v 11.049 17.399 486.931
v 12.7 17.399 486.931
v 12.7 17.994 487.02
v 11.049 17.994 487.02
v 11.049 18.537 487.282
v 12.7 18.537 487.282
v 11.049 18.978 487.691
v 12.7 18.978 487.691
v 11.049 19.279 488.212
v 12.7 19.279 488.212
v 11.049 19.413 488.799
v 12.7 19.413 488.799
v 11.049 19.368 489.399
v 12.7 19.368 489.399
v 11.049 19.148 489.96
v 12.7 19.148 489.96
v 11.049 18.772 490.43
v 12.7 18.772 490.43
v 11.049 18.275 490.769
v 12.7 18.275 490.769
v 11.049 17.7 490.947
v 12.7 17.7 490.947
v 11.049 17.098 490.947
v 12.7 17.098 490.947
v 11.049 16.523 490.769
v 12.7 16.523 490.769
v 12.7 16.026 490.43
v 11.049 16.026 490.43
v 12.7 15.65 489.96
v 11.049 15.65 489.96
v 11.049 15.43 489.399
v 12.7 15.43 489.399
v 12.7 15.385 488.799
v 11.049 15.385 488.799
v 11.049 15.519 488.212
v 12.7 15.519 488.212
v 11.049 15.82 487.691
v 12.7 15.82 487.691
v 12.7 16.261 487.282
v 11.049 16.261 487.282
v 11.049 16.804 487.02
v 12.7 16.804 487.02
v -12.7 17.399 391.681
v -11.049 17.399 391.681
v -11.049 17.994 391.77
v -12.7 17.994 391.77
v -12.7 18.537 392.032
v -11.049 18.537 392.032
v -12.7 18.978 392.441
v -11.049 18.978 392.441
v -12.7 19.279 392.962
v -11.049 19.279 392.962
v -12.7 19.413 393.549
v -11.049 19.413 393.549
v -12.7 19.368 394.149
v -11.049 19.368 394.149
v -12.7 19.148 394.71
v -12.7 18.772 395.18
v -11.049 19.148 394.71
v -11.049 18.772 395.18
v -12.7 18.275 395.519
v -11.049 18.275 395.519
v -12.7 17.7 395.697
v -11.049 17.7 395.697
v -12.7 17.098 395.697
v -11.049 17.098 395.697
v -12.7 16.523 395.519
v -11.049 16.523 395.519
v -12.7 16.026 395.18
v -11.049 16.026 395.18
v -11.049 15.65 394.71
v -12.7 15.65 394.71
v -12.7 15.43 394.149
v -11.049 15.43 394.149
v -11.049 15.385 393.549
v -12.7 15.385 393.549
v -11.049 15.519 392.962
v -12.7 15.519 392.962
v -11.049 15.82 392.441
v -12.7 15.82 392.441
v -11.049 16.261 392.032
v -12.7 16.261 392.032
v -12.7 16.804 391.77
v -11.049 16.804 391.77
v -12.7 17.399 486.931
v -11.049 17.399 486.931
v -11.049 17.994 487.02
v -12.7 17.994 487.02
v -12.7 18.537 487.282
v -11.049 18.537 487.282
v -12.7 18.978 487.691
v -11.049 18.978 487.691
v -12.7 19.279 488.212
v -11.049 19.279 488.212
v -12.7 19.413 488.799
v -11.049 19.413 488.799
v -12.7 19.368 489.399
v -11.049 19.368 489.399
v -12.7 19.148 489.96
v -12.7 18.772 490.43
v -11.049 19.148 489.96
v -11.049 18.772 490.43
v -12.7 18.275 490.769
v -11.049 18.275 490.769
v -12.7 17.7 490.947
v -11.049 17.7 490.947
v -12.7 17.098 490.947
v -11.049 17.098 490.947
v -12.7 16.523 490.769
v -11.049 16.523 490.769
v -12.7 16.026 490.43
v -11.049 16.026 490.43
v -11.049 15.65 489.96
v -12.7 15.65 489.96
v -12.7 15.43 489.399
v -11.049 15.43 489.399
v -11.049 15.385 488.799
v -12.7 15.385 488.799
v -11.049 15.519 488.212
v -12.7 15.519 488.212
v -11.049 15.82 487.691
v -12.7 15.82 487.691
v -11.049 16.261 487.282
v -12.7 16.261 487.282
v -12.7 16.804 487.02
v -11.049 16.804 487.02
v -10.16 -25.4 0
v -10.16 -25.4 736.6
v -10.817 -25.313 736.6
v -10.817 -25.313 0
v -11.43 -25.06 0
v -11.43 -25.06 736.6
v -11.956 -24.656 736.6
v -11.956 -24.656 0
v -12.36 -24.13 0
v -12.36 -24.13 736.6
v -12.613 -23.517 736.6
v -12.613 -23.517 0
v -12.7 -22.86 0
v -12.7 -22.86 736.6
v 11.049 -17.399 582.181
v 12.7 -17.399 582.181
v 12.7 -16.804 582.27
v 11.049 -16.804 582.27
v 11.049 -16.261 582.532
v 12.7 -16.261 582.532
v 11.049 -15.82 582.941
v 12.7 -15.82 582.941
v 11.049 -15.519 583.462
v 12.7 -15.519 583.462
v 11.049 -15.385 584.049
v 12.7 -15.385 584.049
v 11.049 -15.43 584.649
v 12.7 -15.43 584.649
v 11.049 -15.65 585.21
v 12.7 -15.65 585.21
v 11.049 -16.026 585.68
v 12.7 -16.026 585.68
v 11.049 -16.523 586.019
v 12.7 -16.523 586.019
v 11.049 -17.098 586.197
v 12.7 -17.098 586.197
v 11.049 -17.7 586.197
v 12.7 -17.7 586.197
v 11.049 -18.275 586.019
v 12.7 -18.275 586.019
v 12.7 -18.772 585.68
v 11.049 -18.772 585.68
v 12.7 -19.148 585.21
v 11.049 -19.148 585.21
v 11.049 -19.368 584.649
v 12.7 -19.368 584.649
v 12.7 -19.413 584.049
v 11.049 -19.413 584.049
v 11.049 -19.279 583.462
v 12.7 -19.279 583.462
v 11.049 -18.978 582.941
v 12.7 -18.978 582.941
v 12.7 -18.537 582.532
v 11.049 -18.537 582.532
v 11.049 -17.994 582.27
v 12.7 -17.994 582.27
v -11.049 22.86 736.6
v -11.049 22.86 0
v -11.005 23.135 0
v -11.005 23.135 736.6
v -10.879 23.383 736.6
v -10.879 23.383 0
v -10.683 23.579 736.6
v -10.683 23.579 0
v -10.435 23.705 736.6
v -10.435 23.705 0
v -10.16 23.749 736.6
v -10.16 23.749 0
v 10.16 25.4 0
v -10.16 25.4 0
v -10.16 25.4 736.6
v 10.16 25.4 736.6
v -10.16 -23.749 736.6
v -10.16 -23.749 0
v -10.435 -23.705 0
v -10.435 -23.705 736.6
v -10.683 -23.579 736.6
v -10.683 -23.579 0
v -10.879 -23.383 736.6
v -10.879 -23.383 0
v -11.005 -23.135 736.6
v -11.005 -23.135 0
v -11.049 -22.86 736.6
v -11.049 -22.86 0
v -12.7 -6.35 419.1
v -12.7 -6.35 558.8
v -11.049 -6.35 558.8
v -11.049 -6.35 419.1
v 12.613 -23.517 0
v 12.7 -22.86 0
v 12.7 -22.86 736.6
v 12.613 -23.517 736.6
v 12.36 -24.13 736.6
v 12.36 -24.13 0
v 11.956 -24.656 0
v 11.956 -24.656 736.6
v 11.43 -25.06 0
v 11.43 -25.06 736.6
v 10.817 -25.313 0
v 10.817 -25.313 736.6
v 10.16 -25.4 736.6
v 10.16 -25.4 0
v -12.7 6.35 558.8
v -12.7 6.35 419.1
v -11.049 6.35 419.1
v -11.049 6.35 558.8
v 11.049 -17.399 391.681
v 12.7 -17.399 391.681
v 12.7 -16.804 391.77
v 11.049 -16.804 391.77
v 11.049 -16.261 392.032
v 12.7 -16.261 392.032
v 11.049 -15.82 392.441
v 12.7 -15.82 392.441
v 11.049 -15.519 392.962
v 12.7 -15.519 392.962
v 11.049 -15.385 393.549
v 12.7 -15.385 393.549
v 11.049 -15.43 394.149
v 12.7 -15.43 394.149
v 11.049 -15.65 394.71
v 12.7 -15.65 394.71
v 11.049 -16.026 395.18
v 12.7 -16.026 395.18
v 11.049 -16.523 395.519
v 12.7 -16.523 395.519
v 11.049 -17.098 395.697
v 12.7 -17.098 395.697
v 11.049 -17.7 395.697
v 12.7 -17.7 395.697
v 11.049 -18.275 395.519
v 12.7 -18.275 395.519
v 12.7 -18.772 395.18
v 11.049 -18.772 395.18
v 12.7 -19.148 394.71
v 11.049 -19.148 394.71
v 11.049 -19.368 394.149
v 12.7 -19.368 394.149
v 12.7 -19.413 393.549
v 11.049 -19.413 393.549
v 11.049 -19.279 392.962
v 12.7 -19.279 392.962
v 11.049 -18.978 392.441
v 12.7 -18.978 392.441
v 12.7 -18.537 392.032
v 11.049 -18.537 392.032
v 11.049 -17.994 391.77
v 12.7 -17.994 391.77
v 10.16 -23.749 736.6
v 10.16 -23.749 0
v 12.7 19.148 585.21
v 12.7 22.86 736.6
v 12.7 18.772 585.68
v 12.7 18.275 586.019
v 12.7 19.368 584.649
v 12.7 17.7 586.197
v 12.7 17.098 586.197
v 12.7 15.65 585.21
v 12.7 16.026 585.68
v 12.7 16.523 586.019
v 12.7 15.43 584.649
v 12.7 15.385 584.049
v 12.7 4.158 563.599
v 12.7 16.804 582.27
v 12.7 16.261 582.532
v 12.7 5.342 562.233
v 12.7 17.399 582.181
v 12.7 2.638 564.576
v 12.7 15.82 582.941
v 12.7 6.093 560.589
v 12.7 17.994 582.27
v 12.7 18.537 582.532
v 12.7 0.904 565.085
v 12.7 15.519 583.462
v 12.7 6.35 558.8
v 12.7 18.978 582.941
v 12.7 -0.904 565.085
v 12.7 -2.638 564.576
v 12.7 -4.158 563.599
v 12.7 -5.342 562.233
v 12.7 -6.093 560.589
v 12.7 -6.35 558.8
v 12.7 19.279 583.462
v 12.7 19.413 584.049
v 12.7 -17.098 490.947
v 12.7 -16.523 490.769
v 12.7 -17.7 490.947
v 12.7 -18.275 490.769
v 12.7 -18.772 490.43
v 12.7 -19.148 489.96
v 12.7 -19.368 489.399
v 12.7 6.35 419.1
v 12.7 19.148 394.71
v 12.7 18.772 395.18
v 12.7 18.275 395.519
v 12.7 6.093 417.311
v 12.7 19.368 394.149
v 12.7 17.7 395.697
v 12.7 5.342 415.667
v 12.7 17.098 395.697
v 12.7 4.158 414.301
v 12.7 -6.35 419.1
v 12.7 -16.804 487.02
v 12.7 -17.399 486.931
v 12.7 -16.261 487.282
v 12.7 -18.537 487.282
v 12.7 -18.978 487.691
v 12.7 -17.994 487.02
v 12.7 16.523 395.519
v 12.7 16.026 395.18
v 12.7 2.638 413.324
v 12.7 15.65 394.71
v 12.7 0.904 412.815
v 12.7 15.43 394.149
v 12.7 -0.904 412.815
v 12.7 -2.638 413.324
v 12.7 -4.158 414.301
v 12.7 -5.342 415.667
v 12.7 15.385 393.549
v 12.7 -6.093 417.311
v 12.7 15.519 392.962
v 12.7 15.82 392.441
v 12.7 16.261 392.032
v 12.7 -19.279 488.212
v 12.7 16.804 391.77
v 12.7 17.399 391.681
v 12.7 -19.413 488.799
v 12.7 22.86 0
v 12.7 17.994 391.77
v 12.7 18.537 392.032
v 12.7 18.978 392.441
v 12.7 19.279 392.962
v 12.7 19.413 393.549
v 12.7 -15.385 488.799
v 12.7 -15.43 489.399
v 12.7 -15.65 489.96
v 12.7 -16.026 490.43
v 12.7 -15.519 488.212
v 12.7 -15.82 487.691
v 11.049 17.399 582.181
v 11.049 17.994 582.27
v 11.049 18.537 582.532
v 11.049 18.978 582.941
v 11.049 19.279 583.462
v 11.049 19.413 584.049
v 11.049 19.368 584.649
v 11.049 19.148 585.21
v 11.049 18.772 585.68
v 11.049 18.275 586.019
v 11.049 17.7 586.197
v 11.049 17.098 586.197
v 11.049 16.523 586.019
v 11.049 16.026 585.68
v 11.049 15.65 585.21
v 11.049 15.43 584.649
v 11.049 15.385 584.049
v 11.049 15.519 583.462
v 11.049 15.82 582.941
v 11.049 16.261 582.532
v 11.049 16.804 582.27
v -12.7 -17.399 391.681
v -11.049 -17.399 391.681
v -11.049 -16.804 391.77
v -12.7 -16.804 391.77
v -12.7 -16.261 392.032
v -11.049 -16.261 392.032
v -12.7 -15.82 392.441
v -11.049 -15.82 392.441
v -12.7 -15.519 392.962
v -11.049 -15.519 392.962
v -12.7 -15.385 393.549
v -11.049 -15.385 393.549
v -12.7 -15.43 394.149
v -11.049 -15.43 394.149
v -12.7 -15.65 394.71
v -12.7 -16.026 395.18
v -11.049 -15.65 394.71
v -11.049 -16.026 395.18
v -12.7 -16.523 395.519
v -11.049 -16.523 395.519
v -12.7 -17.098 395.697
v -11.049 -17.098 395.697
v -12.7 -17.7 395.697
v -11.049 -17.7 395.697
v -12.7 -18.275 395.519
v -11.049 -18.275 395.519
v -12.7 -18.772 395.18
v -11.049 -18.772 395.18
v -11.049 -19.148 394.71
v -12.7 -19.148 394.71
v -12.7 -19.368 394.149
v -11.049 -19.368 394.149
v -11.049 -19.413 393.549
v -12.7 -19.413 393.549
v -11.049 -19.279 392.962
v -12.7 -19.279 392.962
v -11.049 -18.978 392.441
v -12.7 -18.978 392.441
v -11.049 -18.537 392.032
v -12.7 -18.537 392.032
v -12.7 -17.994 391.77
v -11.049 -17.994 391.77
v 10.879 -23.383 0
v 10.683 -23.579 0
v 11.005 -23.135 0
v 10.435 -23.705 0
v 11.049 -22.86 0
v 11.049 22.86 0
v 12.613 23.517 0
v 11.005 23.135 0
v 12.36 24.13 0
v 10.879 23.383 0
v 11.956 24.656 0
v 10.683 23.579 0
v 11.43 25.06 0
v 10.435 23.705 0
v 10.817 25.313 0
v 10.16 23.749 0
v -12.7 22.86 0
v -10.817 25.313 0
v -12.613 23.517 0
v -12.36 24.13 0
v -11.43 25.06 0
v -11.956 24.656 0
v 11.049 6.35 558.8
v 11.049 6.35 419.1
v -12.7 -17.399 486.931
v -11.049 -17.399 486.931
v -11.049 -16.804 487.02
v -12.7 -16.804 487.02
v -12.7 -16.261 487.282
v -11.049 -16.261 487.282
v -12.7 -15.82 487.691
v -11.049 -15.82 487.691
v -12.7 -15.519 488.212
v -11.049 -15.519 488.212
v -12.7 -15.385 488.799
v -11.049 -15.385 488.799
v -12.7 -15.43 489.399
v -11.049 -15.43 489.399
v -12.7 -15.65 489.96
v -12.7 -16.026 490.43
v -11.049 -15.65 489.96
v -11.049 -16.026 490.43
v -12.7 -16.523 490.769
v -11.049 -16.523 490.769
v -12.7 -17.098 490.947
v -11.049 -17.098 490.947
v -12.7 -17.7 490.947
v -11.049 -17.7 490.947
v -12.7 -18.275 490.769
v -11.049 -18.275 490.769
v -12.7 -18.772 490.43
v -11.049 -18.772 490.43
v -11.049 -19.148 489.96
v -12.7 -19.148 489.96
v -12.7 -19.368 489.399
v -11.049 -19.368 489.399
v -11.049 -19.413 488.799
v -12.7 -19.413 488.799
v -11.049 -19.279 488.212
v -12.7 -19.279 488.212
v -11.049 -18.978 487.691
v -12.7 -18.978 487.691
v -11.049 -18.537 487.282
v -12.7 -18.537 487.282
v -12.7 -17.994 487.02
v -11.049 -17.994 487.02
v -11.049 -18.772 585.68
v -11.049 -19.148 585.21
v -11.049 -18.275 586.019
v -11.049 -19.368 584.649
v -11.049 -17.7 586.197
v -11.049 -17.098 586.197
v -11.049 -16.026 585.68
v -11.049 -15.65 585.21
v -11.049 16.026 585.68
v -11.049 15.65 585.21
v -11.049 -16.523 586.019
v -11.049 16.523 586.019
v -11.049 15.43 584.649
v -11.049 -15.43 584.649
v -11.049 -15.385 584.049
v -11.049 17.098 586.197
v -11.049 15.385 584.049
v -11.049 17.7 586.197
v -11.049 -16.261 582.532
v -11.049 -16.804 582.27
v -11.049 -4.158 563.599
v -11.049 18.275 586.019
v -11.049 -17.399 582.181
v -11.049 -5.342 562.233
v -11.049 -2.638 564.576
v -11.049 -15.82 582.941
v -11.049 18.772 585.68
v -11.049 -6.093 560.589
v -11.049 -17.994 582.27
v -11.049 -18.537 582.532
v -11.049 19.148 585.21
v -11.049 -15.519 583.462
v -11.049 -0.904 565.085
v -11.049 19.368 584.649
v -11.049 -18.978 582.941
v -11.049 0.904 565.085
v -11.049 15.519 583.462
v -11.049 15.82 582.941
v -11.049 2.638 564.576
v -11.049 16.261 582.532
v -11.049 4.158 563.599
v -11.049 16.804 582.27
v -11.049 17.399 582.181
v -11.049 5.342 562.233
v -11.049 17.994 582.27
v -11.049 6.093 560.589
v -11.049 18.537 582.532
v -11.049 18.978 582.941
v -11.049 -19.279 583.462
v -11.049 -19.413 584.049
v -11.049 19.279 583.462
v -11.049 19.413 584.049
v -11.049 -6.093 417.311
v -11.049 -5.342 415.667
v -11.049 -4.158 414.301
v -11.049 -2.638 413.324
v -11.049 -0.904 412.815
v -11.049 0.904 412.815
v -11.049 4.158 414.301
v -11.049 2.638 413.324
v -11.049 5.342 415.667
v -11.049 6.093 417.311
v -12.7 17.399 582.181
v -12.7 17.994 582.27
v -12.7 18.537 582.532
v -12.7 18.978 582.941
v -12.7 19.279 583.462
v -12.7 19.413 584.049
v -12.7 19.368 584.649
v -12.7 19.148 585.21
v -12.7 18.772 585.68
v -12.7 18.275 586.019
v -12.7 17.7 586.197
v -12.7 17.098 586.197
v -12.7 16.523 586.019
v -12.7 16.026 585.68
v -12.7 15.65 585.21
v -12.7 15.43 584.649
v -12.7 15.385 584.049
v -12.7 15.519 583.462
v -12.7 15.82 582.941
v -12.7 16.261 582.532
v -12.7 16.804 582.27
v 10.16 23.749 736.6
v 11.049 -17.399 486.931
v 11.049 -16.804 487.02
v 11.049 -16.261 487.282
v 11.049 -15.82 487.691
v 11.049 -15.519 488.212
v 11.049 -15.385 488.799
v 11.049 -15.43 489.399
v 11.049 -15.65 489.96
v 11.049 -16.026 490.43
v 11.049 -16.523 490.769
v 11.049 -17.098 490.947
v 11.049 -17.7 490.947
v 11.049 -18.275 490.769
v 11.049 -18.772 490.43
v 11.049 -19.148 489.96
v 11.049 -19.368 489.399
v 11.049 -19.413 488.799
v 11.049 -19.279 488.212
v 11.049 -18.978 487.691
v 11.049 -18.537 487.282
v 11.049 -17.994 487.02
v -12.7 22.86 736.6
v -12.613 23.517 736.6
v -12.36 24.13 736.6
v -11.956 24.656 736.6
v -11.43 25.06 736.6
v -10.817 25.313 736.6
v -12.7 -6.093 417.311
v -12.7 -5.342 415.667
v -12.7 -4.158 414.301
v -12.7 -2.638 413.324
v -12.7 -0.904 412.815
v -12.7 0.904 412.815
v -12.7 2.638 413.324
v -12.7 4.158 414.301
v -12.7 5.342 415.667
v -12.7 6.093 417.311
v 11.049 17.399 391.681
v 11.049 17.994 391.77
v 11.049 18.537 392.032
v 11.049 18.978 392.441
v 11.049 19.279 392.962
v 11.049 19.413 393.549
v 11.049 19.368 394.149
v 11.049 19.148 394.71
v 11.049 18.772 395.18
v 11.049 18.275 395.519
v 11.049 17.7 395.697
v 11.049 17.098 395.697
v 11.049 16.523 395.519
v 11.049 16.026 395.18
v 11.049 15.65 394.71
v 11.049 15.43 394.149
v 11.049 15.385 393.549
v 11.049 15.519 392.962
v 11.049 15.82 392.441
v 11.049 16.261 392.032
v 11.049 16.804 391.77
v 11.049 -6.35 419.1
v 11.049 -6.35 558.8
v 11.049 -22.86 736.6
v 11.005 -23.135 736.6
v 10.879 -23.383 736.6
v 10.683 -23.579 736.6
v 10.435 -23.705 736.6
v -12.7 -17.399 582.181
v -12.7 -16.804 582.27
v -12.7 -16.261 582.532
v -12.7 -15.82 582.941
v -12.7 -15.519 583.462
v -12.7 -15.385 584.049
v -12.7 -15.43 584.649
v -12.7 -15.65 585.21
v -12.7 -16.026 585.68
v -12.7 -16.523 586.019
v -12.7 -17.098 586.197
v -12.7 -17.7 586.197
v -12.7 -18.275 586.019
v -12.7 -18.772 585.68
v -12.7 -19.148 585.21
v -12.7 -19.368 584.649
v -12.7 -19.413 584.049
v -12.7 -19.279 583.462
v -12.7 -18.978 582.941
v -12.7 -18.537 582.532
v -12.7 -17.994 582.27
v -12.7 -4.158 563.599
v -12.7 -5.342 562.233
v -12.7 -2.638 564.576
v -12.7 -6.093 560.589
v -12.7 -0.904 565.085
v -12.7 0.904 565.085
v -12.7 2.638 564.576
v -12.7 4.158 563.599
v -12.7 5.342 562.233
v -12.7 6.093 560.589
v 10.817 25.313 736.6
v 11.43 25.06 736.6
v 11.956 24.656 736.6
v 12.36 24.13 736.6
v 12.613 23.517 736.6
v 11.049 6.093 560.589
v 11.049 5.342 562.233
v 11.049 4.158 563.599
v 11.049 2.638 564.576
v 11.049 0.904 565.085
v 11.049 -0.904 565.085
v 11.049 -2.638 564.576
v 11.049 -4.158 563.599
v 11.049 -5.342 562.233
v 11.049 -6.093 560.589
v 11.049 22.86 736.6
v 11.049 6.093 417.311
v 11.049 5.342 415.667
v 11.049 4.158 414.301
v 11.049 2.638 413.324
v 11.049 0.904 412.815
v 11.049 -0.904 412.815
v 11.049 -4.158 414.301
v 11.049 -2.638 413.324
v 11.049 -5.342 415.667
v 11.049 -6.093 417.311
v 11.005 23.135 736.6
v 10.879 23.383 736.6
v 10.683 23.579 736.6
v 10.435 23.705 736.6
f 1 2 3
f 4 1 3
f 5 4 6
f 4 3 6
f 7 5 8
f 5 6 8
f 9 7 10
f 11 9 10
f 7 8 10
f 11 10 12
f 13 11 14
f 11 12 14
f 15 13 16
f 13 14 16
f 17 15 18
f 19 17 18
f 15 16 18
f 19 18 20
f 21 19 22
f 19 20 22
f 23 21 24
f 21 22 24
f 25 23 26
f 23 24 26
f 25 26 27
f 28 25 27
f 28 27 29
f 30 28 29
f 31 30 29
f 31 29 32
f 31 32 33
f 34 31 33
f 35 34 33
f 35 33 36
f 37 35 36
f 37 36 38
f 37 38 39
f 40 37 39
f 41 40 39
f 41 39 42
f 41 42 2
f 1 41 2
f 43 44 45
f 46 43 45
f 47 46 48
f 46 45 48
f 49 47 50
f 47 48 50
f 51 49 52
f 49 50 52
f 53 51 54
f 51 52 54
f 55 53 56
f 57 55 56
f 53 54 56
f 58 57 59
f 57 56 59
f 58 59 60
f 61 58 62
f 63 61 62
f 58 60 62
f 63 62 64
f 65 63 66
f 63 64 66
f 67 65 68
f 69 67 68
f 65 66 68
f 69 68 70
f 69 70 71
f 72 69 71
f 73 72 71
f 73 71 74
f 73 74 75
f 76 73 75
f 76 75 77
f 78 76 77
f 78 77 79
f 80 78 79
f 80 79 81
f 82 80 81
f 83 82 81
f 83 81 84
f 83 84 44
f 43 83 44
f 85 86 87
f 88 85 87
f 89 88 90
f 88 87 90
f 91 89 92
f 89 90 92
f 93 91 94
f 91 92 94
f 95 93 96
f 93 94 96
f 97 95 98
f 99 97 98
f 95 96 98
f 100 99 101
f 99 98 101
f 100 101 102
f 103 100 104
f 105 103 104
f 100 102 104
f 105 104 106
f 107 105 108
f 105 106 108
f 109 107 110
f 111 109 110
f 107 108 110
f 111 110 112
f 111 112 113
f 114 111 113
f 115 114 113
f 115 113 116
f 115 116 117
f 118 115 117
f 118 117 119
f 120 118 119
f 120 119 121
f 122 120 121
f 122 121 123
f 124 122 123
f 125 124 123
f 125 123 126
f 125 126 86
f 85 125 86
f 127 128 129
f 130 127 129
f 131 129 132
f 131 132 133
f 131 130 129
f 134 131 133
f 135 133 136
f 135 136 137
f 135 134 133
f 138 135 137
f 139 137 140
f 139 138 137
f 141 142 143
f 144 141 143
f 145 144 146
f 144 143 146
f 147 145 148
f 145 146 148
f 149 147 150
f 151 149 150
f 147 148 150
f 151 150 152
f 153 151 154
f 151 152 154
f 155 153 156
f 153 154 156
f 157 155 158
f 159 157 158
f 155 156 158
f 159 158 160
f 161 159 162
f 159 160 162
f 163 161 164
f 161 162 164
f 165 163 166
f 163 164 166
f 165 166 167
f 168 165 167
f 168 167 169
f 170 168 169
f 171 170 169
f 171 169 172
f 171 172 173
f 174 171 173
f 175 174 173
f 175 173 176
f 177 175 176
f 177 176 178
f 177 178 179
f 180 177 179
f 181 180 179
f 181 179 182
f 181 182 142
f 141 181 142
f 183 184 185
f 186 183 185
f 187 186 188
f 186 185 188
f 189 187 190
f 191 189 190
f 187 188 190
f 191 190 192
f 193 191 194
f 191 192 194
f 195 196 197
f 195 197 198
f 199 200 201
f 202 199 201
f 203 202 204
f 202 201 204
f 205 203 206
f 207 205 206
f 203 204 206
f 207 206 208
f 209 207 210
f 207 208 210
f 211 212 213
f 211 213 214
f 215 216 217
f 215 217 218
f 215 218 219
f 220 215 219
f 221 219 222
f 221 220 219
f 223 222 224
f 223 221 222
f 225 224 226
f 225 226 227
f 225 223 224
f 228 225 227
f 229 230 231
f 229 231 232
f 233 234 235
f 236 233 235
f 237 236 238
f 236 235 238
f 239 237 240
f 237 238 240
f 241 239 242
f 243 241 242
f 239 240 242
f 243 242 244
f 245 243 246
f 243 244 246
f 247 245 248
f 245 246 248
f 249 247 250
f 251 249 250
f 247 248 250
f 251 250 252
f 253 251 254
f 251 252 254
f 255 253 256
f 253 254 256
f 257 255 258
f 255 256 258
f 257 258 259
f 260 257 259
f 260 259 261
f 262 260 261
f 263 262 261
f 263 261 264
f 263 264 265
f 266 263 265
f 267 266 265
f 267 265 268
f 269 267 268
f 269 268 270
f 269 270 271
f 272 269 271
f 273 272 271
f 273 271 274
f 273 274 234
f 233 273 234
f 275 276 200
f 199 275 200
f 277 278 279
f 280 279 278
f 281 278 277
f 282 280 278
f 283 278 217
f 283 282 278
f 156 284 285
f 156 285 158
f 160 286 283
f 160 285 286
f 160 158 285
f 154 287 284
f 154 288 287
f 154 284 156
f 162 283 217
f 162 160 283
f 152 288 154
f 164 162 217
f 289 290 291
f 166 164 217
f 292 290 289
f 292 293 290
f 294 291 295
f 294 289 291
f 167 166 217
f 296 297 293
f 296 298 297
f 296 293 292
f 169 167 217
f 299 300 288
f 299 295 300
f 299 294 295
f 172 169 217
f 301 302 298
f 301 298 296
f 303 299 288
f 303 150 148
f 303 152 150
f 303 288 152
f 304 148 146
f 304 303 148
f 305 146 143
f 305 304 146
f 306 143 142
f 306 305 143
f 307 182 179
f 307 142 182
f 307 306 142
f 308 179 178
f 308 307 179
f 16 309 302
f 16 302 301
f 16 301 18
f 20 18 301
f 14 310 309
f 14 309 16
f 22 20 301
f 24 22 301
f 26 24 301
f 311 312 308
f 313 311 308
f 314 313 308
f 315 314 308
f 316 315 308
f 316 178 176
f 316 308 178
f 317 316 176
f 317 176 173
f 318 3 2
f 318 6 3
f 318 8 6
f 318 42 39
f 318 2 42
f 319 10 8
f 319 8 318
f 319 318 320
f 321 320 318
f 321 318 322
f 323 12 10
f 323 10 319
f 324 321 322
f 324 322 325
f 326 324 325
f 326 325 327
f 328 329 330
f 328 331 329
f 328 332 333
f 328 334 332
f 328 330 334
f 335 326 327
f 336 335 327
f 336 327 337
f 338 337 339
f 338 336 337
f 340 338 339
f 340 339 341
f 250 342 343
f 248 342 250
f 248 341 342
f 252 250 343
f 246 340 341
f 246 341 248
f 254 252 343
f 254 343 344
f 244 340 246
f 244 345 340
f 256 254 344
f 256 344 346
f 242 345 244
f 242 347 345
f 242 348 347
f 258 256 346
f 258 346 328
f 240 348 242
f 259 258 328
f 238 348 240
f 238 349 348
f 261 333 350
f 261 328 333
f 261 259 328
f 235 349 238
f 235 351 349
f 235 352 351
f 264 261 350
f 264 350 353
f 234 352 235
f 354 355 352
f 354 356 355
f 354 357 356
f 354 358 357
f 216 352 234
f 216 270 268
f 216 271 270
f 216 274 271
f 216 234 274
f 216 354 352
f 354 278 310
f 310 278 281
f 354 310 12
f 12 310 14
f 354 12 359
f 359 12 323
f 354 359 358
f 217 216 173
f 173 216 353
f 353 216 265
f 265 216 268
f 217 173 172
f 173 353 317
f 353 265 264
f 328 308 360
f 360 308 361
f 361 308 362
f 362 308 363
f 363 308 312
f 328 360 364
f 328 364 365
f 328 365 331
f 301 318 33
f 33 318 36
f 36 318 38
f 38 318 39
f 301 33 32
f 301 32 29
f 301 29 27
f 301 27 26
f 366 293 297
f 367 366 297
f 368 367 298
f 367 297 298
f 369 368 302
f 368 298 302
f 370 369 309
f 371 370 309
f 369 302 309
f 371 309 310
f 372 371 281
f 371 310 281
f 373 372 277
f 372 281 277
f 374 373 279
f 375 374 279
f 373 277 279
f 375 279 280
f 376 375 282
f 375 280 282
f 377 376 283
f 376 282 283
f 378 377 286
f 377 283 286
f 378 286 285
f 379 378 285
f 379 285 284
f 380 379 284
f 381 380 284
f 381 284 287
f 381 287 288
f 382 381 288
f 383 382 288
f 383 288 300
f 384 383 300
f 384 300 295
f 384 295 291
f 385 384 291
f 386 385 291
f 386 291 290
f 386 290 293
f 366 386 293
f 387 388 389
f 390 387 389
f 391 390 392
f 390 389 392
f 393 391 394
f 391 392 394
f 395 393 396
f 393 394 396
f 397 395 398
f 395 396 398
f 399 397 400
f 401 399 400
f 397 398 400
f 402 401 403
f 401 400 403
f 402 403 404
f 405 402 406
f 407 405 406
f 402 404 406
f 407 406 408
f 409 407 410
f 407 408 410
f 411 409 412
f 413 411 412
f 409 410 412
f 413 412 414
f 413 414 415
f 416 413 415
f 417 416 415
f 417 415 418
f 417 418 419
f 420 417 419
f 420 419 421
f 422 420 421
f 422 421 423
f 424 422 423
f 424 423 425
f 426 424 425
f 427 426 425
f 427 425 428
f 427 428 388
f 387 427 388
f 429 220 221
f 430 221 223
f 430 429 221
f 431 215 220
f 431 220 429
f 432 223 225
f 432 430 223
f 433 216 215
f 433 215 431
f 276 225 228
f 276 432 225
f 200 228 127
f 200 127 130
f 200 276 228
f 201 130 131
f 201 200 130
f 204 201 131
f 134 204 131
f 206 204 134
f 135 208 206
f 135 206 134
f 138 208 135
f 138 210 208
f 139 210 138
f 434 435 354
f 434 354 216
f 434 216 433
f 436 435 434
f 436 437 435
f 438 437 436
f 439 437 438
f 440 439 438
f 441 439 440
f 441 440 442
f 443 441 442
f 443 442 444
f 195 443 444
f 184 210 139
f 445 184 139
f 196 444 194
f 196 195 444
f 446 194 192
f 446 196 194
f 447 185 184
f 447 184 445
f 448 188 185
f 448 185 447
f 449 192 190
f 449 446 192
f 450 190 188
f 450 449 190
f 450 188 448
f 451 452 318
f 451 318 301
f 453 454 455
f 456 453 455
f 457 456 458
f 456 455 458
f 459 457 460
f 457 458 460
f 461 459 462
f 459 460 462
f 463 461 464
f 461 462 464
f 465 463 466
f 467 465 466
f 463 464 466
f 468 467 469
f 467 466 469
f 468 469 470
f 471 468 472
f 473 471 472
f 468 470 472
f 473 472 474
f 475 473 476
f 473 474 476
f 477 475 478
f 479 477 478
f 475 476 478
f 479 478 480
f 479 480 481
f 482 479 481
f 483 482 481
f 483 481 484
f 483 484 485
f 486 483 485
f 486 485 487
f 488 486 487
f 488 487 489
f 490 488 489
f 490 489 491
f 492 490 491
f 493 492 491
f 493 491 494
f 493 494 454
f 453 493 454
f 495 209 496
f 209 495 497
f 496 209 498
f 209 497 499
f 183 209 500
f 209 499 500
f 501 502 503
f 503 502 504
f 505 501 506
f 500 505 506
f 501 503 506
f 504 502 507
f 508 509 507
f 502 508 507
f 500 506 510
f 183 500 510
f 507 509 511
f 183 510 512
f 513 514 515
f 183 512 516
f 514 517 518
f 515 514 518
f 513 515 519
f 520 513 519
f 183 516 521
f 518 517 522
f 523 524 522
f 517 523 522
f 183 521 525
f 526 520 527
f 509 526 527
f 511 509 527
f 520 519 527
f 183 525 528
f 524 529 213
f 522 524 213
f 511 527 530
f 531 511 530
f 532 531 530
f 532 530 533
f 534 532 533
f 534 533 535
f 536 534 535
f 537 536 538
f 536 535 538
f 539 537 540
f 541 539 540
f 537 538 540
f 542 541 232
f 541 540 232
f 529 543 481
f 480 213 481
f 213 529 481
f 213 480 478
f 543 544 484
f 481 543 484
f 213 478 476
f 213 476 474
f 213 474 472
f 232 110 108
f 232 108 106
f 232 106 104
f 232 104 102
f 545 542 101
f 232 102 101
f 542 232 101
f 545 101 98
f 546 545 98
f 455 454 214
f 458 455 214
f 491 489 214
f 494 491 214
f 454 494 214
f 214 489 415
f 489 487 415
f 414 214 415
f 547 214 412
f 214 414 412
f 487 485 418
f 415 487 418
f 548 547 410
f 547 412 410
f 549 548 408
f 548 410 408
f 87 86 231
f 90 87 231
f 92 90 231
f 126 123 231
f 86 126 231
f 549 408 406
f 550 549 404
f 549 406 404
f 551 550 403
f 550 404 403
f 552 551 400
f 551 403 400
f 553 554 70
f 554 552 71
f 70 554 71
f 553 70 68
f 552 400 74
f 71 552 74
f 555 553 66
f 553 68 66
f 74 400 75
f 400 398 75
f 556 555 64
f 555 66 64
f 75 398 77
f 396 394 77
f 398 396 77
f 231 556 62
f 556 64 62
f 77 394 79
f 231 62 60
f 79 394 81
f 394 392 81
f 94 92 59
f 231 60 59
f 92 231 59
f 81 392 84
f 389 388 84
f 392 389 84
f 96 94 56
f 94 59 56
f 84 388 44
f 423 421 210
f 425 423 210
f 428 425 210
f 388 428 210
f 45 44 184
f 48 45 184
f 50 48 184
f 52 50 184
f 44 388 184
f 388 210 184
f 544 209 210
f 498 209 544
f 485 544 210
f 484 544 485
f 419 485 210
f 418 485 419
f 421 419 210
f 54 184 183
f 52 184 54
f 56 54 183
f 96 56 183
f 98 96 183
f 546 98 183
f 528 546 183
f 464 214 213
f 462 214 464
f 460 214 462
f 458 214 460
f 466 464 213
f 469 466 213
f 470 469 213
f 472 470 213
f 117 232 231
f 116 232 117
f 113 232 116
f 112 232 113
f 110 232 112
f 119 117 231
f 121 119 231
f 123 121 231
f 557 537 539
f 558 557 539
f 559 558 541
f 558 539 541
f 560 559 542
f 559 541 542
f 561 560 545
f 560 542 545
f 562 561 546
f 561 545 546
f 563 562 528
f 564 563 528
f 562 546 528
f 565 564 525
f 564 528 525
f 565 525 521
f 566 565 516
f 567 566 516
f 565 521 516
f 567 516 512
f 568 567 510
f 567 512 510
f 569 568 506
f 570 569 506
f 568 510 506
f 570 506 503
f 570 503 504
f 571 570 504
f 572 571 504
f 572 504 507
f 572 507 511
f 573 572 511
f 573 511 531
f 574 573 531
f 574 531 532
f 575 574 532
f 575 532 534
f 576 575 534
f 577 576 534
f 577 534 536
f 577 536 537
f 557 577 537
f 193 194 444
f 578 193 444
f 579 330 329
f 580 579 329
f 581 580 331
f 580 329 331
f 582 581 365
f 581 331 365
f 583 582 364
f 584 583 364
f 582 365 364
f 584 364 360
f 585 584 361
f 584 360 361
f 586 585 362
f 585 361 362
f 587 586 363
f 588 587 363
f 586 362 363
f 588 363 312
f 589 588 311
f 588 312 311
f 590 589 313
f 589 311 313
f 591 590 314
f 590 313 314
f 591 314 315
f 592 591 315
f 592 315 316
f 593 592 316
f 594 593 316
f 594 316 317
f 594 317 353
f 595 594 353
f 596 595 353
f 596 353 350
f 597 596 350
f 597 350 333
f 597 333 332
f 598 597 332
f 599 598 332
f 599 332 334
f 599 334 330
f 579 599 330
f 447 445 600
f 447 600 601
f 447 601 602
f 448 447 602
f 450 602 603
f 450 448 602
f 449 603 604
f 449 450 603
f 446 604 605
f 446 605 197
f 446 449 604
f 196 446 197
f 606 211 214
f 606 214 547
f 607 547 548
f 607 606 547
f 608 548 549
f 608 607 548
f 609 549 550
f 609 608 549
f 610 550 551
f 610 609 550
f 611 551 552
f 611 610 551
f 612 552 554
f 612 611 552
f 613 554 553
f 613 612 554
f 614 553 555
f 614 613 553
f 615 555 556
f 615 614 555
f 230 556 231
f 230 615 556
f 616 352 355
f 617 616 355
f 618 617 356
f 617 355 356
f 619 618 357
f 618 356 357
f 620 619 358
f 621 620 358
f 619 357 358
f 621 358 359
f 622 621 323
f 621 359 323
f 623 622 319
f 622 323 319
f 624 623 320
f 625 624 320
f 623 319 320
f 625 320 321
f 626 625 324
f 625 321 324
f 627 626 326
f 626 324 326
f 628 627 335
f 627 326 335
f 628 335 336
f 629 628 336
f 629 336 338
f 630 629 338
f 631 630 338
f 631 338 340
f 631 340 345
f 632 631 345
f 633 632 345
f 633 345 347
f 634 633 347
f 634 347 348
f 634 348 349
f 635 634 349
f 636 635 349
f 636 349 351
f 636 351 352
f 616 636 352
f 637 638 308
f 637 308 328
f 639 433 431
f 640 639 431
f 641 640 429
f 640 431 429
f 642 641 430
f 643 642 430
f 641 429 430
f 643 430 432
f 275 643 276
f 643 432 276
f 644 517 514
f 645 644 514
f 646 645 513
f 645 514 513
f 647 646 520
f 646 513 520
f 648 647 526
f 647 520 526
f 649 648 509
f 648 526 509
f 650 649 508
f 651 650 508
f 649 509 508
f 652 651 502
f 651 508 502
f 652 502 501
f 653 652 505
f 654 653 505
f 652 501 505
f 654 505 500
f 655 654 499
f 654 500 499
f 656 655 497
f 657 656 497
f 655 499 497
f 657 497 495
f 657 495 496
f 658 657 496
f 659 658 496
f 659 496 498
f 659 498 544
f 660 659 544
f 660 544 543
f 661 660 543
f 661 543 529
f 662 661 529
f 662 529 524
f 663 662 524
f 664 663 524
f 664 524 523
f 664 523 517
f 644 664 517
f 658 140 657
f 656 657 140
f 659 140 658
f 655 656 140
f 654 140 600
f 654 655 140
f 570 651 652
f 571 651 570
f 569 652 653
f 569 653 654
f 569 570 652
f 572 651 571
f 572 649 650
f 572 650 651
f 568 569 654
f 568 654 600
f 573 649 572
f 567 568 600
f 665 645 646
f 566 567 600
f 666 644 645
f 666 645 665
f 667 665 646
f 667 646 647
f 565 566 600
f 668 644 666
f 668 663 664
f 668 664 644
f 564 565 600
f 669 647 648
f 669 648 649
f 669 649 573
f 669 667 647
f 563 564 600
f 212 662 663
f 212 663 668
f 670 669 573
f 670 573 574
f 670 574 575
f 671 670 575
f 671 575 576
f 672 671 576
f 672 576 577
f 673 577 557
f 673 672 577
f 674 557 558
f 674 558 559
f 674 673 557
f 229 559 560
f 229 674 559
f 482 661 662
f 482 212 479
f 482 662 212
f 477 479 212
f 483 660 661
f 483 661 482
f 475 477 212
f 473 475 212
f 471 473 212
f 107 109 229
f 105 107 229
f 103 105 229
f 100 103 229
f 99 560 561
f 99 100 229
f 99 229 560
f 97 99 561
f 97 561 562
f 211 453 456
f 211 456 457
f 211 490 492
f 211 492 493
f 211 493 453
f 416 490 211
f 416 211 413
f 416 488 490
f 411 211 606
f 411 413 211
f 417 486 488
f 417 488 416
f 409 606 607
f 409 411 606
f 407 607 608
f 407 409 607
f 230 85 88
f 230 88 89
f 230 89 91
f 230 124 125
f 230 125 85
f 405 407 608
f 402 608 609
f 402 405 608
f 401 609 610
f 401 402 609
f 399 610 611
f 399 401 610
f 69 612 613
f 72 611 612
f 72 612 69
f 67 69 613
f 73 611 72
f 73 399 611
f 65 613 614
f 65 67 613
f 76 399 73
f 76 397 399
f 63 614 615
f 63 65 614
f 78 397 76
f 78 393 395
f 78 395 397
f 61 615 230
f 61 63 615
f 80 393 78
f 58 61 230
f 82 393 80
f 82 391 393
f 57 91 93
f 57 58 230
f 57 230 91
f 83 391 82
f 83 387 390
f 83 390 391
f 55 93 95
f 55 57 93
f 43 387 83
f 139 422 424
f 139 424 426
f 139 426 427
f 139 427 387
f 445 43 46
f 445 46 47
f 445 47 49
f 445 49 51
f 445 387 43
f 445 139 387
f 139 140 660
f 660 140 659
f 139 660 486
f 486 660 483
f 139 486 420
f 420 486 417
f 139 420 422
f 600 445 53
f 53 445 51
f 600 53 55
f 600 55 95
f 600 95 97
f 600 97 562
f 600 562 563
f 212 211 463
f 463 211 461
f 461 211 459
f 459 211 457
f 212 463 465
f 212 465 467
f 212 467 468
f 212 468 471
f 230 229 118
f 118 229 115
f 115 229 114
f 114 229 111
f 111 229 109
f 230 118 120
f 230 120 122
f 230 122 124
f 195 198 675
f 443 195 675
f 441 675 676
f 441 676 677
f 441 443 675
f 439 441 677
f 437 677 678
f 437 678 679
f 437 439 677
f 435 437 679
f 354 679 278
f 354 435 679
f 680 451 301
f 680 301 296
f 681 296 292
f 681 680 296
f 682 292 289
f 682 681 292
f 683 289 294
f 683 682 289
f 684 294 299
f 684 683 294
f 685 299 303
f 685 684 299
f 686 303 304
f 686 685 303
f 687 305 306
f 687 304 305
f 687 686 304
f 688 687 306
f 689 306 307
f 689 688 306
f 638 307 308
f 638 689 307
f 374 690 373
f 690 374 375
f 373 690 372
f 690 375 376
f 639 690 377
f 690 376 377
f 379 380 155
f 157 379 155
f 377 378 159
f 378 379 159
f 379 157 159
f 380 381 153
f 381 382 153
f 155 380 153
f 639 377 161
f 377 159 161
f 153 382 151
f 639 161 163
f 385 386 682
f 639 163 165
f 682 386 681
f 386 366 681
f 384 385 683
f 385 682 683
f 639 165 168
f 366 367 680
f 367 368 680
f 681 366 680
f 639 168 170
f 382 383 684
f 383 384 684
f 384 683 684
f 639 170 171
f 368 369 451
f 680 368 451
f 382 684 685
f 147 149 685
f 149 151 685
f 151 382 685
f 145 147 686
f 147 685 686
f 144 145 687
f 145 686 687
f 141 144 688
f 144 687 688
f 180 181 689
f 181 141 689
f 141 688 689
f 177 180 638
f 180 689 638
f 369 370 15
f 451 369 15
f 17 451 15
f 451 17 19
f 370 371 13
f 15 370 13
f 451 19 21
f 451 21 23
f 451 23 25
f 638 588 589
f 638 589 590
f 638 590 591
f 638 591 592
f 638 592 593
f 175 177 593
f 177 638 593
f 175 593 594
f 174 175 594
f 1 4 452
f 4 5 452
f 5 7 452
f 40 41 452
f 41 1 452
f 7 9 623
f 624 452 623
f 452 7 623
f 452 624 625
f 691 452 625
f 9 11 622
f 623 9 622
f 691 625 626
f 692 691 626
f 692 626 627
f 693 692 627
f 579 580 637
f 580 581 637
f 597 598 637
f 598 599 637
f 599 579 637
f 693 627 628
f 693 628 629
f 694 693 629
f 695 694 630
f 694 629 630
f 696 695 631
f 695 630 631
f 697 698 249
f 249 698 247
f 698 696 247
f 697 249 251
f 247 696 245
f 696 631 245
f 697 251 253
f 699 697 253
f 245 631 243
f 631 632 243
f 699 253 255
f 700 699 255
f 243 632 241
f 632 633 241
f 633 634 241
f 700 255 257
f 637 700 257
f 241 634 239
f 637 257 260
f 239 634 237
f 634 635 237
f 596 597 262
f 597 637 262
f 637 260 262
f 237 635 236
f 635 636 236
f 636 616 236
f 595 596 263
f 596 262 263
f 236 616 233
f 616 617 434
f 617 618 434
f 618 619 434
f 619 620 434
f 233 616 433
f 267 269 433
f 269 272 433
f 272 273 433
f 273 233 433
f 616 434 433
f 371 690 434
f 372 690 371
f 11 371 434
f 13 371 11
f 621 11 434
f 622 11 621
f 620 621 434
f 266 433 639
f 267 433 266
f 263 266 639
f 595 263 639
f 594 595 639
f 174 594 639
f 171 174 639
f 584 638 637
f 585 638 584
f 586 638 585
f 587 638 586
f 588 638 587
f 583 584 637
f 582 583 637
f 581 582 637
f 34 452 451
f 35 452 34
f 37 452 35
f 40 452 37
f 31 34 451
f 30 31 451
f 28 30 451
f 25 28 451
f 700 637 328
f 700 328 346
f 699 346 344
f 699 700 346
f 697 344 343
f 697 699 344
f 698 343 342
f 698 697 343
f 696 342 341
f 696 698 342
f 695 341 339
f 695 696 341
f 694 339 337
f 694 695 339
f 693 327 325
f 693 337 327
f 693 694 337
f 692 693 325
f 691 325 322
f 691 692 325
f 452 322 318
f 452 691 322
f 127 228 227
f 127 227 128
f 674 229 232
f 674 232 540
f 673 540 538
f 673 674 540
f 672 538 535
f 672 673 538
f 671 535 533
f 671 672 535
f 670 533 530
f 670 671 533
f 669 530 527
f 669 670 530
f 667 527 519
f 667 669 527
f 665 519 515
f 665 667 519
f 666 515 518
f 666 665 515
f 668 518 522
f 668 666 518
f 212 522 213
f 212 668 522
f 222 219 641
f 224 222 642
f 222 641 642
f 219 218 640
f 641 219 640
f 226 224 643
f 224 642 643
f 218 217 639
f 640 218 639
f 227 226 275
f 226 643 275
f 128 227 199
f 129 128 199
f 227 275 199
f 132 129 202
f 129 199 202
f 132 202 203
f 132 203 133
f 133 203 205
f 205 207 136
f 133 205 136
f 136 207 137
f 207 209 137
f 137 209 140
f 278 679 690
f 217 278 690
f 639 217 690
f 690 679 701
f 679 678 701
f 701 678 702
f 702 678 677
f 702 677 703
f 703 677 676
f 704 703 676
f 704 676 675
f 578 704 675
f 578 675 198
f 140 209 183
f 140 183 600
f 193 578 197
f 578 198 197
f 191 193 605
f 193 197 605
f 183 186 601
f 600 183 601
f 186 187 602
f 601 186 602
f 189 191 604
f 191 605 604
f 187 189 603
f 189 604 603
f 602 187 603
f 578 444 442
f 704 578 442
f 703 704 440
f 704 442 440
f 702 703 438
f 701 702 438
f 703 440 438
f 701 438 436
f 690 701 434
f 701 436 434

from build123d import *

# Parameters (mm, degrees)
EXTRUDE_THIN1_DEPTH = 736.6
CUT_EXTRUDE2_DEPTH  = 738.475341961
SKETCH5_R           = 2.0193
CUT_EXTRUDE3_DEPTH  = 738.475341961


with BuildPart() as part:
    # Sketch1 → Extrude-Thin1 (new body)
    with BuildSketch(Plane.XY):
        with BuildLine():
            Line((-10.16, 25.4), (10.16, 25.4))
            ThreePointArc((10.16, 25.4), (11.956051224, 24.656051224), (12.7, 22.86))
            Line((12.7, 22.86), (12.7, -22.86))
            ThreePointArc((12.7, -22.86), (11.956051224, -24.656051224), (10.16, -25.4))
            Line((10.16, -25.4), (-10.16, -25.4))
            ThreePointArc((-10.16, -25.4), (-11.956051224, -24.656051224), (-12.7, -22.86))
            Line((-12.7, -22.86), (-12.7, 22.86))
            ThreePointArc((-12.7, 22.86), (-11.956051224, 24.656051224), (-10.16, 25.4))
        make_face()
        with BuildLine():
            Line((-10.16, 23.749), (10.16, 23.749))
            ThreePointArc((10.16, 23.749), (10.788617928, 23.488617928), (11.049, 22.86))
            Line((11.049, 22.86), (11.049, -22.86))
            ThreePointArc((11.049, -22.86), (10.788617928, -23.488617928), (10.16, -23.749))
            Line((10.16, -23.749), (-10.16, -23.749))
            ThreePointArc((-10.16, -23.749), (-10.788617928, -23.488617928), (-11.049, -22.86))
            Line((-11.049, -22.86), (-11.049, 22.86))
            ThreePointArc((-11.049, 22.86), (-10.788617928, 23.488617928), (-10.16, 23.749))
        make_face(mode=Mode.SUBTRACT)
    extrude(amount=EXTRUDE_THIN1_DEPTH)

    # Sketch3 → Cut-Extrude2 (cut, through all)
    with BuildSketch(Plane.ZY.offset(12.7)):
        with BuildLine():
            Line((558.8, -6.35), (419.1, -6.35))
            ThreePointArc((419.1, -6.35), (412.75, 0), (419.1, 6.35))
            Line((419.1, 6.35), (558.8, 6.35))
            ThreePointArc((558.8, 6.35), (565.15, 0), (558.8, -6.35))
        make_face()
    extrude(amount=-CUT_EXTRUDE2_DEPTH, mode=Mode.SUBTRACT)

    # Sketch5 → Cut-Extrude3 (cut, through all)
    with BuildSketch(Plane(origin=(12.7, 0, 0), x_dir=(0, 0, -1), z_dir=(1, 0, 0))):
        with Locations((-393.7, 17.399)):
            Circle(SKETCH5_R)
        with Locations((-393.7, -17.399)):
            Circle(SKETCH5_R)
        with Locations((-488.95, 17.399)):
            Circle(SKETCH5_R)
        with Locations((-488.95, -17.399)):
            Circle(SKETCH5_R)
        with Locations((-584.2, -17.399)):
            Circle(SKETCH5_R)
        with Locations((-584.2, 17.399)):
            Circle(SKETCH5_R)
    extrude(amount=-CUT_EXTRUDE3_DEPTH, mode=Mode.SUBTRACT)


solid = part.part
